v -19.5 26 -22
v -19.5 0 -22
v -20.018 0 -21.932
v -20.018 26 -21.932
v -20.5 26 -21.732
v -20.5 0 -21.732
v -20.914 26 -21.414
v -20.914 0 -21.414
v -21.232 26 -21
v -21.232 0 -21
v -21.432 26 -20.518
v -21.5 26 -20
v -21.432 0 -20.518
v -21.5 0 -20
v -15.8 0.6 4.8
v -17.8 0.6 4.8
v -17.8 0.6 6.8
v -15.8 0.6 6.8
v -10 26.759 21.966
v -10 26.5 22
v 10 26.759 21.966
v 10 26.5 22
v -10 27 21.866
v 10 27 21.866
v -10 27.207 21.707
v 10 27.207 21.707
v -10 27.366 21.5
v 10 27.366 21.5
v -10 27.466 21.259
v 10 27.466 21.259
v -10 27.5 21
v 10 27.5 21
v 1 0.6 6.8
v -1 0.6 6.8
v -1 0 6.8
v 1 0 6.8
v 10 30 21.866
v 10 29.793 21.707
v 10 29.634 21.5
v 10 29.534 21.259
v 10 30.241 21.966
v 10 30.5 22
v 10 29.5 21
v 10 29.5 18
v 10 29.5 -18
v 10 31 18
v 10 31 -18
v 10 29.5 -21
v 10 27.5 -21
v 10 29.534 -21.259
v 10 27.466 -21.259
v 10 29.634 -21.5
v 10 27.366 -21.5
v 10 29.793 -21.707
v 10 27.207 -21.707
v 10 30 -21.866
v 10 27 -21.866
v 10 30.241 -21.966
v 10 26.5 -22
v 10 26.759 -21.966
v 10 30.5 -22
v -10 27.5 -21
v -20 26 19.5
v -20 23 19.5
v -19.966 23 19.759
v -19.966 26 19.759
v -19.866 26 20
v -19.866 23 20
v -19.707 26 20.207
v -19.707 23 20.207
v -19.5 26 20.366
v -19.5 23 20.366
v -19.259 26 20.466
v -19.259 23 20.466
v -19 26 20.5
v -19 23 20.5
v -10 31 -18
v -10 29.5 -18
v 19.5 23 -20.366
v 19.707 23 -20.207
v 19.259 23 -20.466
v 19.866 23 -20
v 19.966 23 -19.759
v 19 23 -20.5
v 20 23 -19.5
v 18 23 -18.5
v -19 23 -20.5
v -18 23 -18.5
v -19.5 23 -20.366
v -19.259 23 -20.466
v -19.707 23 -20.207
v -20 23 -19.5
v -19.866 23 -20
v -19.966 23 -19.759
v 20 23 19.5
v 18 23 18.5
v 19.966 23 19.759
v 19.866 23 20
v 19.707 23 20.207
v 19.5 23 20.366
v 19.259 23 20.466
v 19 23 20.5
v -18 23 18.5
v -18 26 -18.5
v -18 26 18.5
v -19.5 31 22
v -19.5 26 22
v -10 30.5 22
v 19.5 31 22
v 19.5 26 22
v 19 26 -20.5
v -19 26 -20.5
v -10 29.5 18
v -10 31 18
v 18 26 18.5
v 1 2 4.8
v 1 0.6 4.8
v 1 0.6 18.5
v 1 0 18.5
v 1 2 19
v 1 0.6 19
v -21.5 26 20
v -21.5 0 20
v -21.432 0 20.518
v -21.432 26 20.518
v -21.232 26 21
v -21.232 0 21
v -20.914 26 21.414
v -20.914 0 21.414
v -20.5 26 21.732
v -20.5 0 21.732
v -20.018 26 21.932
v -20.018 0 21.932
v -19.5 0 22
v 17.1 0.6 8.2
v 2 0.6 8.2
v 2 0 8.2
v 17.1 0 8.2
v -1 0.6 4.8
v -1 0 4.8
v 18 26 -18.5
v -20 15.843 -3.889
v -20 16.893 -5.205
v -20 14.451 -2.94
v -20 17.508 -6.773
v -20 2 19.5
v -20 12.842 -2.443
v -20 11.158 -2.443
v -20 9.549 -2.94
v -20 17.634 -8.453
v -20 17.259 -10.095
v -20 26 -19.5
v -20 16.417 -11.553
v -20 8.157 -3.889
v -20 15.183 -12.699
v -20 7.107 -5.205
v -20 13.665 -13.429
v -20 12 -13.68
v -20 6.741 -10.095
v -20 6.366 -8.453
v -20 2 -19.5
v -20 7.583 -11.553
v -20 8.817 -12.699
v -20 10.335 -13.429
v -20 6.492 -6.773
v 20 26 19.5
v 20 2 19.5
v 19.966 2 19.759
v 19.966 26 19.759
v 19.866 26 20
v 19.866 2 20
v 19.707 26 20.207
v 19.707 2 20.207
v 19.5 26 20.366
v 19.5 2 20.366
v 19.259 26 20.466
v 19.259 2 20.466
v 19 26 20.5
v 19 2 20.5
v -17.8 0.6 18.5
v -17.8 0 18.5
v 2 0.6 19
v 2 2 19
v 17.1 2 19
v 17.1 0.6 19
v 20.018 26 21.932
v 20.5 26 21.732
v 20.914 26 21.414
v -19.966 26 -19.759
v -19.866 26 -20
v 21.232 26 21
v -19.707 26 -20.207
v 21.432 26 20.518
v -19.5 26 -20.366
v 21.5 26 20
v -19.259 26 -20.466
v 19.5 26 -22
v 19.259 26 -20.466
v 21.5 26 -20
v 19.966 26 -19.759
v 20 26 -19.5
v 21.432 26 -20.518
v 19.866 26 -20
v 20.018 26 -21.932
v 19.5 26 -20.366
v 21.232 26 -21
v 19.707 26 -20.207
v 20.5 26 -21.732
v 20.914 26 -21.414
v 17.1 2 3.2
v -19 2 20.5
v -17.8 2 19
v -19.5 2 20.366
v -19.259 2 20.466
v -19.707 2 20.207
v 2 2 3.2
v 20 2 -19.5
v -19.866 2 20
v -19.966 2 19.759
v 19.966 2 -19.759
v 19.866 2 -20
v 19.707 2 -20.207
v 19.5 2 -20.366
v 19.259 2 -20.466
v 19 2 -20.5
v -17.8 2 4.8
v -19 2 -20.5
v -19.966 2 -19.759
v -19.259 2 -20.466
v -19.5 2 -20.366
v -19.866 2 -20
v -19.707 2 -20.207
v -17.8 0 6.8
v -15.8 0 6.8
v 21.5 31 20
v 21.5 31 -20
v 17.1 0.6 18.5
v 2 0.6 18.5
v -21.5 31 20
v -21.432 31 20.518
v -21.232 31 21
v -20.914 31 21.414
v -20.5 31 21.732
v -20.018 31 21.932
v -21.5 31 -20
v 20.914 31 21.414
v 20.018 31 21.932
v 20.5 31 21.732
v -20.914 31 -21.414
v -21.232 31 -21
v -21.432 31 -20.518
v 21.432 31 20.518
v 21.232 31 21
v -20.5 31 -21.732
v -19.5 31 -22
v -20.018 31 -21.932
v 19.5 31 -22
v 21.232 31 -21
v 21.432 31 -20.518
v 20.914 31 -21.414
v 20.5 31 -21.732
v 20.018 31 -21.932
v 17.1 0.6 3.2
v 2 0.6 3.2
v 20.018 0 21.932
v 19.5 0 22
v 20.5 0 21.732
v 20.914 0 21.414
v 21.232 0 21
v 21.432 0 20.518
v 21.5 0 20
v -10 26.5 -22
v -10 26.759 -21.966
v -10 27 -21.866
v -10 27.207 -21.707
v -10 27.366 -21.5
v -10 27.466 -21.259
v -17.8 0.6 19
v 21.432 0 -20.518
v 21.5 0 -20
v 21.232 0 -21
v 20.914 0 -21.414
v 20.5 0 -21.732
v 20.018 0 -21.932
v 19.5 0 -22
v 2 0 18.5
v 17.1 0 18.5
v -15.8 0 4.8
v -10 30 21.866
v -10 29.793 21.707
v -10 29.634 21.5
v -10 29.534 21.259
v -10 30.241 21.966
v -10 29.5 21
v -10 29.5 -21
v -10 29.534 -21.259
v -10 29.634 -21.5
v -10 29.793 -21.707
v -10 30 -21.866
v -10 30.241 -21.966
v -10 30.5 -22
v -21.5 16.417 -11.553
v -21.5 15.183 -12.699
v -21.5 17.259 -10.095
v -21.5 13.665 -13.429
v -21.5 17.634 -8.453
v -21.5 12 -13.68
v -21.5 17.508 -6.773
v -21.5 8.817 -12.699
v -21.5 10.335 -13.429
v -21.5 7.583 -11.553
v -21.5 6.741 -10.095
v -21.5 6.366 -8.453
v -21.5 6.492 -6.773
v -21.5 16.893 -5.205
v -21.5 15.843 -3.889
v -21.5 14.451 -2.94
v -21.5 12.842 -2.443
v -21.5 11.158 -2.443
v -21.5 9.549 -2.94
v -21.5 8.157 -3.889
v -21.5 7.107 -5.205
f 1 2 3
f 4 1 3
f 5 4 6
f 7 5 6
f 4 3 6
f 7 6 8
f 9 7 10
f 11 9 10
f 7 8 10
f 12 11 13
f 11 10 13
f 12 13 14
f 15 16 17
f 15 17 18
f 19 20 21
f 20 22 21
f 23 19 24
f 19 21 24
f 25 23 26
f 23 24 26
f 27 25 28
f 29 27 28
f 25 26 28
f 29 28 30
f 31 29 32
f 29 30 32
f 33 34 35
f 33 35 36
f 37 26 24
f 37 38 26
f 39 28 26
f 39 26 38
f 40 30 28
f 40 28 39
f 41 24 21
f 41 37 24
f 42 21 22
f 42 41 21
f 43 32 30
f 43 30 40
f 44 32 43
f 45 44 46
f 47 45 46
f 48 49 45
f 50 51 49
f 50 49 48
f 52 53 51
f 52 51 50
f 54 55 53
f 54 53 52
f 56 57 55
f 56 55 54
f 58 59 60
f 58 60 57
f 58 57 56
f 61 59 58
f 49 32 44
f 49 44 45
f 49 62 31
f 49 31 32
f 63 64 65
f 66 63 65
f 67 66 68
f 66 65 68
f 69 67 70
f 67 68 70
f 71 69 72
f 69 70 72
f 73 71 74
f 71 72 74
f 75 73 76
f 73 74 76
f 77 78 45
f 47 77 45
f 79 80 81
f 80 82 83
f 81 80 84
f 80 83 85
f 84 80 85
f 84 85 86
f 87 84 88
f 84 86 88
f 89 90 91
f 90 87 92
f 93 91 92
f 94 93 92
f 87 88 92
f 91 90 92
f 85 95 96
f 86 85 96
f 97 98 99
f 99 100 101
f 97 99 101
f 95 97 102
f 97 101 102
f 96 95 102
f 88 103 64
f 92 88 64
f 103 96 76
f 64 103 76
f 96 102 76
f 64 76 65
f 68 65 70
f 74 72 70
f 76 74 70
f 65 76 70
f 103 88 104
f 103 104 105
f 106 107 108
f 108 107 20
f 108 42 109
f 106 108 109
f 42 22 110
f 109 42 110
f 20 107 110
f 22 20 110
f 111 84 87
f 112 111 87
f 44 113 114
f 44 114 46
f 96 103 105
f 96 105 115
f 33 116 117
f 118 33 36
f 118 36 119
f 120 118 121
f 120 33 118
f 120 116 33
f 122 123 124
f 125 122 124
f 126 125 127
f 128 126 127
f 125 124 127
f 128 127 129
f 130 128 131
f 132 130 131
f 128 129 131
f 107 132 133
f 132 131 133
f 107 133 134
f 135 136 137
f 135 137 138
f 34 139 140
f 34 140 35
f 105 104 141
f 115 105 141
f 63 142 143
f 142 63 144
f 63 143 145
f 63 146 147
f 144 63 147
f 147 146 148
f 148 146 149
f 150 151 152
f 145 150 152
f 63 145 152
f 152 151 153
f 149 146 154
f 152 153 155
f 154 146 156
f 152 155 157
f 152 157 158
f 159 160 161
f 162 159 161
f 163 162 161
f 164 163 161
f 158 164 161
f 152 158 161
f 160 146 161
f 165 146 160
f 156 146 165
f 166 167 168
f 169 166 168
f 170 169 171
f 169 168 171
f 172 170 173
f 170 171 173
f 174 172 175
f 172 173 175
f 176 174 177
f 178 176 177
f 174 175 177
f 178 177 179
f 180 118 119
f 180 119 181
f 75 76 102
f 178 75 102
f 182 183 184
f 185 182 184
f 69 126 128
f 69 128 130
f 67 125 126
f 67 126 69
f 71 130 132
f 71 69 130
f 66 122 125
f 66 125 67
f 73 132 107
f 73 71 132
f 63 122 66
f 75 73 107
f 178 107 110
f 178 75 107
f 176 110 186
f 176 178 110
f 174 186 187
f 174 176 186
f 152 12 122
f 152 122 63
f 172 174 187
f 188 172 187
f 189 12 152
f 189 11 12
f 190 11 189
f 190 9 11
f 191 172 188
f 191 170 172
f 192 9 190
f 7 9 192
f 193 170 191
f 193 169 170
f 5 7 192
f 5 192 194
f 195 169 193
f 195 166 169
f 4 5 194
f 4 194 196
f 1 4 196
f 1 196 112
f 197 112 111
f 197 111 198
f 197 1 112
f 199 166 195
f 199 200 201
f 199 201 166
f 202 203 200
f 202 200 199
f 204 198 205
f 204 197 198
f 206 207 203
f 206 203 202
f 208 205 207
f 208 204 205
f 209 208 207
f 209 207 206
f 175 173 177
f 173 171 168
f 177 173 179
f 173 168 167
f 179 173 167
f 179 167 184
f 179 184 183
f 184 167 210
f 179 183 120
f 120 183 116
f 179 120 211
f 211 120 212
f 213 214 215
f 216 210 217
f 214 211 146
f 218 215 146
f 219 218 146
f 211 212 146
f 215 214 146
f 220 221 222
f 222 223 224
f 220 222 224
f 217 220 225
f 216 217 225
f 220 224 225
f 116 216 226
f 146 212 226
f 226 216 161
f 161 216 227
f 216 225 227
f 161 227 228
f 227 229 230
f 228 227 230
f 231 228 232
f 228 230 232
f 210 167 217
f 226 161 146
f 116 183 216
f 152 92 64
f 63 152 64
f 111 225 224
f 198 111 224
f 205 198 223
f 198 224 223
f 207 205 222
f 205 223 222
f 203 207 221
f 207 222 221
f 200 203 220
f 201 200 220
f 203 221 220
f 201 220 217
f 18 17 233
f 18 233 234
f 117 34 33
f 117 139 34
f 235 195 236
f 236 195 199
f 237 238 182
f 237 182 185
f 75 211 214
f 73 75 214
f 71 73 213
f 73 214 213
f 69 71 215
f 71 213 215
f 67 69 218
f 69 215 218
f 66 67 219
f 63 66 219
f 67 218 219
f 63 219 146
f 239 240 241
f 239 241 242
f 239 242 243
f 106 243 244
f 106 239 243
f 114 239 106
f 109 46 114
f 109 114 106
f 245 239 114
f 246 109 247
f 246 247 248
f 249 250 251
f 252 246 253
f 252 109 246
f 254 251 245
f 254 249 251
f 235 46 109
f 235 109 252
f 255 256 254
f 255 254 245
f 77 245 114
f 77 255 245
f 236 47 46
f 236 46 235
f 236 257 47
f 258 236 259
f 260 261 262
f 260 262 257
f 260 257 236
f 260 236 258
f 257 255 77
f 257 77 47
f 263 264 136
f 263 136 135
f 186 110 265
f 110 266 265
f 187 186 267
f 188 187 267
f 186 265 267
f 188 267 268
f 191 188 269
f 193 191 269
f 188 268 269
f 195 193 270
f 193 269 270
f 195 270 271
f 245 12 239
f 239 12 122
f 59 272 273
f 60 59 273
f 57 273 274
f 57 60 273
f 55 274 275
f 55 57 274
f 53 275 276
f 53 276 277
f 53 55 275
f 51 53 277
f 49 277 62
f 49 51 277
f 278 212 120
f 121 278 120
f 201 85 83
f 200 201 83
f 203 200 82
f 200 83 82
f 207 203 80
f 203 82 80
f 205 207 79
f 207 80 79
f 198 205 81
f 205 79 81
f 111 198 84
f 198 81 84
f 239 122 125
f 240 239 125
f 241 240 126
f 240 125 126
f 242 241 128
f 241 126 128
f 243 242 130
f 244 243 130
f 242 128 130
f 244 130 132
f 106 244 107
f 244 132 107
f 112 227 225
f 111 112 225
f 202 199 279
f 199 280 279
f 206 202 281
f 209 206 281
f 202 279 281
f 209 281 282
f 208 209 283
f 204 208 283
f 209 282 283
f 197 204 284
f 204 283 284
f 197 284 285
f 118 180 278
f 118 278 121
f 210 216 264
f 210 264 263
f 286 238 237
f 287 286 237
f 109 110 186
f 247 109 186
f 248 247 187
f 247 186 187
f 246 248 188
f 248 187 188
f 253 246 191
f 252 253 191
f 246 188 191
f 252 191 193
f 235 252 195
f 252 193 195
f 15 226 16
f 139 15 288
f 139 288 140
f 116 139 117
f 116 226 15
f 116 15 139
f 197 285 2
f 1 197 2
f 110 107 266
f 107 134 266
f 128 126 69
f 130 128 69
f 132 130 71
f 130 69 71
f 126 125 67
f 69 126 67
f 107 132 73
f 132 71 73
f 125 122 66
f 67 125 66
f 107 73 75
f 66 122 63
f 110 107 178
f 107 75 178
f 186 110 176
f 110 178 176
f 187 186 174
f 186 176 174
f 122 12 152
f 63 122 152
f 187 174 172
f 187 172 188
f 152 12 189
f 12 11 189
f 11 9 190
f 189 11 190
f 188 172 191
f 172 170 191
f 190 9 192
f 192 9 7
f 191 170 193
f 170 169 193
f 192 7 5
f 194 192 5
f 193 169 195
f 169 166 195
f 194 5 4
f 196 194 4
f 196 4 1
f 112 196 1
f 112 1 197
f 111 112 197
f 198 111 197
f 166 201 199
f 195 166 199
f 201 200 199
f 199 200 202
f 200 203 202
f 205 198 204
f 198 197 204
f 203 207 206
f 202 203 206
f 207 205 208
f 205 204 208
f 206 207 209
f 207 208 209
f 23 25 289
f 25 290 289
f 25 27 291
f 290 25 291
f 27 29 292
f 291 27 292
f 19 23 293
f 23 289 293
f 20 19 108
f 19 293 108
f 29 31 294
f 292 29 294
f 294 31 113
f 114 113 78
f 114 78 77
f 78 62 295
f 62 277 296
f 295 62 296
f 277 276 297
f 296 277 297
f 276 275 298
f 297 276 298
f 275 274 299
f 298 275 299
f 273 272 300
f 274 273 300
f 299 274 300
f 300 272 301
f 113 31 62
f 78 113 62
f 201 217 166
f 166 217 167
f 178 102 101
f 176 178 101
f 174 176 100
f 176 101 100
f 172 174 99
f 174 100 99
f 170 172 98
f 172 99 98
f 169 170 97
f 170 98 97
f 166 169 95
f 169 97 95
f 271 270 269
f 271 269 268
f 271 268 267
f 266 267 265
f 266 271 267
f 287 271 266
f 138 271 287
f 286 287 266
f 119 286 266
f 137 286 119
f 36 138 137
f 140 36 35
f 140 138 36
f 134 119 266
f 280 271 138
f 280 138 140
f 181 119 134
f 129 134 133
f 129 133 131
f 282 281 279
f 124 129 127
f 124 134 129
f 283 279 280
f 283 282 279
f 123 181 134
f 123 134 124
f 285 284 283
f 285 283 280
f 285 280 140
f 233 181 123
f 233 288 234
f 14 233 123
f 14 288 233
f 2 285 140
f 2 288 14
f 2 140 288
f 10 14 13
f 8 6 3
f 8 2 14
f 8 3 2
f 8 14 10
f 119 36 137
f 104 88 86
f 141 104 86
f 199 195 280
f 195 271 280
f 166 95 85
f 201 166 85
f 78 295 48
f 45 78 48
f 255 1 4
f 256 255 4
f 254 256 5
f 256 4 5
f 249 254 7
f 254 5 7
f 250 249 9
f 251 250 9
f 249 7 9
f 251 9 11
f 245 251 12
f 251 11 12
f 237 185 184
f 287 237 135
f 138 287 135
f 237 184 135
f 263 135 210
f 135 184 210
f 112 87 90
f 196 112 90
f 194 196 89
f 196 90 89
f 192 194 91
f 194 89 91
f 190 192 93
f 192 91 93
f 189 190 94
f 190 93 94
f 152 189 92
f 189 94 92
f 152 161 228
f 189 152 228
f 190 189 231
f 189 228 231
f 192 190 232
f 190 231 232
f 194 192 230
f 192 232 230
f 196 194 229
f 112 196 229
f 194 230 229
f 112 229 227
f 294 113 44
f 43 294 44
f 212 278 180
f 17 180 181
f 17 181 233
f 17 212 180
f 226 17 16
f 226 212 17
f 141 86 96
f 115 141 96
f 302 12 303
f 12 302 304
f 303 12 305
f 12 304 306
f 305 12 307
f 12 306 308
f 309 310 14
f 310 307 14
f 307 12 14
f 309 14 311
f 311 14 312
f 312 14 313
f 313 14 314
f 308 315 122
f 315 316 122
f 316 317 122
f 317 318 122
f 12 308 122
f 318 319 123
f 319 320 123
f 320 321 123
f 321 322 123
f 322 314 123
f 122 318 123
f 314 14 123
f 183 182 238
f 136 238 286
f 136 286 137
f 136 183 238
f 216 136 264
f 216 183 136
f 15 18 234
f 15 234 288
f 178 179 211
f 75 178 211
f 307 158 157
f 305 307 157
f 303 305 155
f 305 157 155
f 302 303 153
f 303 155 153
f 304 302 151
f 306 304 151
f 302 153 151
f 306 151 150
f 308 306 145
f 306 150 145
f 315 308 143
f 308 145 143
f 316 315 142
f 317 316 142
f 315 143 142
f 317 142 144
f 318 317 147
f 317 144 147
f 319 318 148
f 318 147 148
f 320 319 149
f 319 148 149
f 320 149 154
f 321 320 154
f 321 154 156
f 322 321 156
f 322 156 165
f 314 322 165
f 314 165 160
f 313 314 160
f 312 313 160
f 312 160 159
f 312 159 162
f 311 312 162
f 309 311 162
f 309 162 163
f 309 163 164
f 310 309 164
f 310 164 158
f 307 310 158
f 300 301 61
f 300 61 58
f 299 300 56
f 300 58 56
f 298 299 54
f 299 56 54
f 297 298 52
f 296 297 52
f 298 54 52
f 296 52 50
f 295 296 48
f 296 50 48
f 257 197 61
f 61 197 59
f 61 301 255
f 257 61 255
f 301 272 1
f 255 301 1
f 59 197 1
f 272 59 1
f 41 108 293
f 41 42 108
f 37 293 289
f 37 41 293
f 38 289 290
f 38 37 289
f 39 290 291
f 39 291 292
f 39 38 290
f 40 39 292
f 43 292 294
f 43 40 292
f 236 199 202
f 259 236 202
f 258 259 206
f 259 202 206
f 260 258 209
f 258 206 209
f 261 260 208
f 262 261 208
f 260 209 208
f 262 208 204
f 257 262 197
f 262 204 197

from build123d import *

# Parameters (mm, degrees)
BOSS_EXTRUDE1_DEPTH = 2
SKETCH2_W           = 18.8
SKETCH2_H           = 14.2
SKETCH2_W_2         = 15.1
SKETCH2_H_2         = 15.8
CUT_EXTRUDE1_DEPTH  = 1.4
SKETCH3_W           = 15.1
SKETCH3_H           = 10.3
CUT_EXTRUDE2_DEPTH  = 31.793018689
BOSS_EXTRUDE3_DEPTH = 24
SKETCH16_R          = 5.65
CUT_EXTRUDE6_DEPTH  = 19
BOSS_EXTRUDE4_DEPTH = 5
BOSS_EXTRUDE5_START = 3
SKETCH19_W          = 36
SKETCH19_H          = 37
BOSS_EXTRUDE5_DEPTH = 3
CUT_EXTRUDE7_START  = -44
SKETCH20_W          = 20
SKETCH20_H          = 2
CUT_EXTRUDE7_DEPTH  = 44
FILLET1_R           = 1
SKETCH21_W          = 20
SKETCH21_H          = 36
CUT_EXTRUDE8_DEPTH  = 1.5


with BuildPart() as part:
    # Sketch1 → Boss-Extrude1 (new body)
    with BuildSketch(Plane(origin=(0, 0, 0), x_dir=(1, 0, 0), z_dir=(0, 1, 0))):
        with BuildLine():
            Line((19.5, -22), (-19.5, -22))
            ThreePointArc((-19.5, -22), (-20.914213562, -21.414213562), (-21.5, -20))
            Line((-21.5, -20), (-21.5, 20))
            ThreePointArc((-21.5, 20), (-20.914213562, 21.414213562), (-19.5, 22))
            Line((-19.5, 22), (19.5, 22))
            ThreePointArc((19.5, 22), (20.914213562, 21.414213562), (21.5, 20))
            Line((21.5, 20), (21.5, -20))
            ThreePointArc((21.5, -20), (20.914213562, -21.414213562), (19.5, -22))
        make_face()
    extrude(amount=BOSS_EXTRUDE1_DEPTH)

    # Sketch2 → Cut-Extrude1 (cut)
    with BuildSketch(Plane(origin=(0, 2, 0), x_dir=(1, 0, 0), z_dir=(0, 1, 0))):
        with Locations((-8.4, -11.9)):
            Rectangle(SKETCH2_W, SKETCH2_H)
        with Locations((9.55, -11.1)):
            Rectangle(SKETCH2_W_2, SKETCH2_H_2)
    extrude(amount=-CUT_EXTRUDE1_DEPTH, mode=Mode.SUBTRACT)

    # Sketch3 → Cut-Extrude2 (cut, through all)
    with BuildSketch(Plane(origin=(0, 0.6, 0), x_dir=(1, 0, 0), z_dir=(0, 1, 0))):
        Polygon((-17.8, -6.8), (-15.8, -6.8), (-15.8, -4.8), (-1, -4.8), (-1, -6.8), (1, -6.8), (1, -18.5), (-17.8, -18.5), align=None)
        with Locations((9.55, -13.35)):
            Rectangle(SKETCH3_W, SKETCH3_H)
    extrude(amount=-CUT_EXTRUDE2_DEPTH, mode=Mode.SUBTRACT)

    # Sketch13 → Boss-Extrude3 (add)
    with BuildSketch(Plane(origin=(0, 2, 0), x_dir=(1, 0, 0), z_dir=(0, 1, 0))):
        with BuildLine():
            ThreePointArc((-21.5, -20), (-20.914213562, -21.414213562), (-19.5, -22))
            Line((-19.5, -22), (19.5, -22))
            ThreePointArc((19.5, -22), (20.914213562, -21.414213562), (21.5, -20))
            Line((21.5, -20), (21.5, 20))
            ThreePointArc((21.5, 20), (20.914213562, 21.414213562), (19.5, 22))
            Line((19.5, 22), (-19.5, 22))
            ThreePointArc((-19.5, 22), (-20.914213562, 21.414213562), (-21.5, 20))
            Line((-21.5, 20), (-21.5, -20))
        make_face()
        with BuildLine():
            ThreePointArc((19, 20.5), (19.707106781, 20.207106781), (20, 19.5))
            Line((20, 19.5), (20, -19.5))
            ThreePointArc((20, -19.5), (19.707106781, -20.207106781), (19, -20.5))
            Line((19, -20.5), (-19, -20.5))
            ThreePointArc((-19, -20.5), (-19.707106781, -20.207106781), (-20, -19.5))
            Line((-20, -19.5), (-20, 19.5))
            ThreePointArc((-20, 19.5), (-19.707106781, 20.207106781), (-19, 20.5))
            Line((-19, 20.5), (19, 20.5))
        make_face(mode=Mode.SUBTRACT)
    extrude(amount=BOSS_EXTRUDE3_DEPTH)

    # Sketch16 → Cut-Extrude6 (cut)
    with BuildSketch(Plane(origin=(-20, 0, 0), x_dir=(0, 0, -1), z_dir=(1, 0, 0))):
        with Locations((8.030344885, 12)):
            Circle(SKETCH16_R)
    extrude(amount=-CUT_EXTRUDE6_DEPTH, mode=Mode.SUBTRACT)


with BuildPart() as body_2:
    # Sketch17 → Boss-Extrude4 (new body)
    with BuildSketch(Plane(origin=(0, 26, 0), x_dir=(1, 0, 0), z_dir=(0, 1, 0))):
        with BuildLine():
            Line((21.5, -20), (21.5, 20))
            ThreePointArc((21.5, 20), (20.914213562, 21.414213562), (19.5, 22))
            Line((19.5, 22), (-19.5, 22))
            ThreePointArc((-19.5, 22), (-20.914213562, 21.414213562), (-21.5, 20))
            Line((-21.5, 20), (-21.5, -20))
            ThreePointArc((-21.5, -20), (-20.914213562, -21.414213562), (-19.5, -22))
            Line((-19.5, -22), (19.5, -22))
            ThreePointArc((19.5, -22), (20.914213562, -21.414213562), (21.5, -20))
        make_face()
    extrude(amount=BOSS_EXTRUDE4_DEPTH)

    # Sketch19 → Boss-Extrude5 (add)
    with BuildSketch(Plane.XZ.offset(-26).offset(BOSS_EXTRUDE5_START)):
        with BuildLine():
            Line((20, 19.5), (20, -19.5))
            ThreePointArc((20, -19.5), (19.707106781, -20.207106781), (19, -20.5))
            Line((19, -20.5), (-19, -20.5))
            ThreePointArc((-19, -20.5), (-19.707106781, -20.207106781), (-20, -19.5))
            Line((-20, -19.5), (-20, 19.5))
            ThreePointArc((-20, 19.5), (-19.707106781, 20.207106781), (-19, 20.5))
            Line((-19, 20.5), (19, 20.5))
            ThreePointArc((19, 20.5), (19.707106781, 20.207106781), (20, 19.5))
        make_face()
        Rectangle(SKETCH19_W, SKETCH19_H, mode=Mode.SUBTRACT)
    extrude(amount=-BOSS_EXTRUDE5_DEPTH)

    # Sketch20 → Cut-Extrude7 (cut)
    with BuildSketch(Plane.XY.offset(22).offset(CUT_EXTRUDE7_START)):
        with Locations((0, 28.5)):
            Rectangle(SKETCH20_W, SKETCH20_H)
    extrude(amount=CUT_EXTRUDE7_DEPTH, mode=Mode.SUBTRACT)

    # Fillet1
    fillet1_edges = [body_2.edges().sort_by_distance(p)[0] for p in [
        (0, 27.5, -22),
        (0, 29.5, -22),
        (0, 27.5, 22),
        (0, 29.5, 22),
    ]]
    fillet(fillet1_edges, radius=FILLET1_R)

    # Sketch21 → Cut-Extrude8 (cut)
    with BuildSketch(Plane.XZ.offset(-29.5)):
        Rectangle(SKETCH21_W, SKETCH21_H)
    extrude(amount=-CUT_EXTRUDE8_DEPTH, mode=Mode.SUBTRACT)


solid = Compound([part.part, body_2.part])
